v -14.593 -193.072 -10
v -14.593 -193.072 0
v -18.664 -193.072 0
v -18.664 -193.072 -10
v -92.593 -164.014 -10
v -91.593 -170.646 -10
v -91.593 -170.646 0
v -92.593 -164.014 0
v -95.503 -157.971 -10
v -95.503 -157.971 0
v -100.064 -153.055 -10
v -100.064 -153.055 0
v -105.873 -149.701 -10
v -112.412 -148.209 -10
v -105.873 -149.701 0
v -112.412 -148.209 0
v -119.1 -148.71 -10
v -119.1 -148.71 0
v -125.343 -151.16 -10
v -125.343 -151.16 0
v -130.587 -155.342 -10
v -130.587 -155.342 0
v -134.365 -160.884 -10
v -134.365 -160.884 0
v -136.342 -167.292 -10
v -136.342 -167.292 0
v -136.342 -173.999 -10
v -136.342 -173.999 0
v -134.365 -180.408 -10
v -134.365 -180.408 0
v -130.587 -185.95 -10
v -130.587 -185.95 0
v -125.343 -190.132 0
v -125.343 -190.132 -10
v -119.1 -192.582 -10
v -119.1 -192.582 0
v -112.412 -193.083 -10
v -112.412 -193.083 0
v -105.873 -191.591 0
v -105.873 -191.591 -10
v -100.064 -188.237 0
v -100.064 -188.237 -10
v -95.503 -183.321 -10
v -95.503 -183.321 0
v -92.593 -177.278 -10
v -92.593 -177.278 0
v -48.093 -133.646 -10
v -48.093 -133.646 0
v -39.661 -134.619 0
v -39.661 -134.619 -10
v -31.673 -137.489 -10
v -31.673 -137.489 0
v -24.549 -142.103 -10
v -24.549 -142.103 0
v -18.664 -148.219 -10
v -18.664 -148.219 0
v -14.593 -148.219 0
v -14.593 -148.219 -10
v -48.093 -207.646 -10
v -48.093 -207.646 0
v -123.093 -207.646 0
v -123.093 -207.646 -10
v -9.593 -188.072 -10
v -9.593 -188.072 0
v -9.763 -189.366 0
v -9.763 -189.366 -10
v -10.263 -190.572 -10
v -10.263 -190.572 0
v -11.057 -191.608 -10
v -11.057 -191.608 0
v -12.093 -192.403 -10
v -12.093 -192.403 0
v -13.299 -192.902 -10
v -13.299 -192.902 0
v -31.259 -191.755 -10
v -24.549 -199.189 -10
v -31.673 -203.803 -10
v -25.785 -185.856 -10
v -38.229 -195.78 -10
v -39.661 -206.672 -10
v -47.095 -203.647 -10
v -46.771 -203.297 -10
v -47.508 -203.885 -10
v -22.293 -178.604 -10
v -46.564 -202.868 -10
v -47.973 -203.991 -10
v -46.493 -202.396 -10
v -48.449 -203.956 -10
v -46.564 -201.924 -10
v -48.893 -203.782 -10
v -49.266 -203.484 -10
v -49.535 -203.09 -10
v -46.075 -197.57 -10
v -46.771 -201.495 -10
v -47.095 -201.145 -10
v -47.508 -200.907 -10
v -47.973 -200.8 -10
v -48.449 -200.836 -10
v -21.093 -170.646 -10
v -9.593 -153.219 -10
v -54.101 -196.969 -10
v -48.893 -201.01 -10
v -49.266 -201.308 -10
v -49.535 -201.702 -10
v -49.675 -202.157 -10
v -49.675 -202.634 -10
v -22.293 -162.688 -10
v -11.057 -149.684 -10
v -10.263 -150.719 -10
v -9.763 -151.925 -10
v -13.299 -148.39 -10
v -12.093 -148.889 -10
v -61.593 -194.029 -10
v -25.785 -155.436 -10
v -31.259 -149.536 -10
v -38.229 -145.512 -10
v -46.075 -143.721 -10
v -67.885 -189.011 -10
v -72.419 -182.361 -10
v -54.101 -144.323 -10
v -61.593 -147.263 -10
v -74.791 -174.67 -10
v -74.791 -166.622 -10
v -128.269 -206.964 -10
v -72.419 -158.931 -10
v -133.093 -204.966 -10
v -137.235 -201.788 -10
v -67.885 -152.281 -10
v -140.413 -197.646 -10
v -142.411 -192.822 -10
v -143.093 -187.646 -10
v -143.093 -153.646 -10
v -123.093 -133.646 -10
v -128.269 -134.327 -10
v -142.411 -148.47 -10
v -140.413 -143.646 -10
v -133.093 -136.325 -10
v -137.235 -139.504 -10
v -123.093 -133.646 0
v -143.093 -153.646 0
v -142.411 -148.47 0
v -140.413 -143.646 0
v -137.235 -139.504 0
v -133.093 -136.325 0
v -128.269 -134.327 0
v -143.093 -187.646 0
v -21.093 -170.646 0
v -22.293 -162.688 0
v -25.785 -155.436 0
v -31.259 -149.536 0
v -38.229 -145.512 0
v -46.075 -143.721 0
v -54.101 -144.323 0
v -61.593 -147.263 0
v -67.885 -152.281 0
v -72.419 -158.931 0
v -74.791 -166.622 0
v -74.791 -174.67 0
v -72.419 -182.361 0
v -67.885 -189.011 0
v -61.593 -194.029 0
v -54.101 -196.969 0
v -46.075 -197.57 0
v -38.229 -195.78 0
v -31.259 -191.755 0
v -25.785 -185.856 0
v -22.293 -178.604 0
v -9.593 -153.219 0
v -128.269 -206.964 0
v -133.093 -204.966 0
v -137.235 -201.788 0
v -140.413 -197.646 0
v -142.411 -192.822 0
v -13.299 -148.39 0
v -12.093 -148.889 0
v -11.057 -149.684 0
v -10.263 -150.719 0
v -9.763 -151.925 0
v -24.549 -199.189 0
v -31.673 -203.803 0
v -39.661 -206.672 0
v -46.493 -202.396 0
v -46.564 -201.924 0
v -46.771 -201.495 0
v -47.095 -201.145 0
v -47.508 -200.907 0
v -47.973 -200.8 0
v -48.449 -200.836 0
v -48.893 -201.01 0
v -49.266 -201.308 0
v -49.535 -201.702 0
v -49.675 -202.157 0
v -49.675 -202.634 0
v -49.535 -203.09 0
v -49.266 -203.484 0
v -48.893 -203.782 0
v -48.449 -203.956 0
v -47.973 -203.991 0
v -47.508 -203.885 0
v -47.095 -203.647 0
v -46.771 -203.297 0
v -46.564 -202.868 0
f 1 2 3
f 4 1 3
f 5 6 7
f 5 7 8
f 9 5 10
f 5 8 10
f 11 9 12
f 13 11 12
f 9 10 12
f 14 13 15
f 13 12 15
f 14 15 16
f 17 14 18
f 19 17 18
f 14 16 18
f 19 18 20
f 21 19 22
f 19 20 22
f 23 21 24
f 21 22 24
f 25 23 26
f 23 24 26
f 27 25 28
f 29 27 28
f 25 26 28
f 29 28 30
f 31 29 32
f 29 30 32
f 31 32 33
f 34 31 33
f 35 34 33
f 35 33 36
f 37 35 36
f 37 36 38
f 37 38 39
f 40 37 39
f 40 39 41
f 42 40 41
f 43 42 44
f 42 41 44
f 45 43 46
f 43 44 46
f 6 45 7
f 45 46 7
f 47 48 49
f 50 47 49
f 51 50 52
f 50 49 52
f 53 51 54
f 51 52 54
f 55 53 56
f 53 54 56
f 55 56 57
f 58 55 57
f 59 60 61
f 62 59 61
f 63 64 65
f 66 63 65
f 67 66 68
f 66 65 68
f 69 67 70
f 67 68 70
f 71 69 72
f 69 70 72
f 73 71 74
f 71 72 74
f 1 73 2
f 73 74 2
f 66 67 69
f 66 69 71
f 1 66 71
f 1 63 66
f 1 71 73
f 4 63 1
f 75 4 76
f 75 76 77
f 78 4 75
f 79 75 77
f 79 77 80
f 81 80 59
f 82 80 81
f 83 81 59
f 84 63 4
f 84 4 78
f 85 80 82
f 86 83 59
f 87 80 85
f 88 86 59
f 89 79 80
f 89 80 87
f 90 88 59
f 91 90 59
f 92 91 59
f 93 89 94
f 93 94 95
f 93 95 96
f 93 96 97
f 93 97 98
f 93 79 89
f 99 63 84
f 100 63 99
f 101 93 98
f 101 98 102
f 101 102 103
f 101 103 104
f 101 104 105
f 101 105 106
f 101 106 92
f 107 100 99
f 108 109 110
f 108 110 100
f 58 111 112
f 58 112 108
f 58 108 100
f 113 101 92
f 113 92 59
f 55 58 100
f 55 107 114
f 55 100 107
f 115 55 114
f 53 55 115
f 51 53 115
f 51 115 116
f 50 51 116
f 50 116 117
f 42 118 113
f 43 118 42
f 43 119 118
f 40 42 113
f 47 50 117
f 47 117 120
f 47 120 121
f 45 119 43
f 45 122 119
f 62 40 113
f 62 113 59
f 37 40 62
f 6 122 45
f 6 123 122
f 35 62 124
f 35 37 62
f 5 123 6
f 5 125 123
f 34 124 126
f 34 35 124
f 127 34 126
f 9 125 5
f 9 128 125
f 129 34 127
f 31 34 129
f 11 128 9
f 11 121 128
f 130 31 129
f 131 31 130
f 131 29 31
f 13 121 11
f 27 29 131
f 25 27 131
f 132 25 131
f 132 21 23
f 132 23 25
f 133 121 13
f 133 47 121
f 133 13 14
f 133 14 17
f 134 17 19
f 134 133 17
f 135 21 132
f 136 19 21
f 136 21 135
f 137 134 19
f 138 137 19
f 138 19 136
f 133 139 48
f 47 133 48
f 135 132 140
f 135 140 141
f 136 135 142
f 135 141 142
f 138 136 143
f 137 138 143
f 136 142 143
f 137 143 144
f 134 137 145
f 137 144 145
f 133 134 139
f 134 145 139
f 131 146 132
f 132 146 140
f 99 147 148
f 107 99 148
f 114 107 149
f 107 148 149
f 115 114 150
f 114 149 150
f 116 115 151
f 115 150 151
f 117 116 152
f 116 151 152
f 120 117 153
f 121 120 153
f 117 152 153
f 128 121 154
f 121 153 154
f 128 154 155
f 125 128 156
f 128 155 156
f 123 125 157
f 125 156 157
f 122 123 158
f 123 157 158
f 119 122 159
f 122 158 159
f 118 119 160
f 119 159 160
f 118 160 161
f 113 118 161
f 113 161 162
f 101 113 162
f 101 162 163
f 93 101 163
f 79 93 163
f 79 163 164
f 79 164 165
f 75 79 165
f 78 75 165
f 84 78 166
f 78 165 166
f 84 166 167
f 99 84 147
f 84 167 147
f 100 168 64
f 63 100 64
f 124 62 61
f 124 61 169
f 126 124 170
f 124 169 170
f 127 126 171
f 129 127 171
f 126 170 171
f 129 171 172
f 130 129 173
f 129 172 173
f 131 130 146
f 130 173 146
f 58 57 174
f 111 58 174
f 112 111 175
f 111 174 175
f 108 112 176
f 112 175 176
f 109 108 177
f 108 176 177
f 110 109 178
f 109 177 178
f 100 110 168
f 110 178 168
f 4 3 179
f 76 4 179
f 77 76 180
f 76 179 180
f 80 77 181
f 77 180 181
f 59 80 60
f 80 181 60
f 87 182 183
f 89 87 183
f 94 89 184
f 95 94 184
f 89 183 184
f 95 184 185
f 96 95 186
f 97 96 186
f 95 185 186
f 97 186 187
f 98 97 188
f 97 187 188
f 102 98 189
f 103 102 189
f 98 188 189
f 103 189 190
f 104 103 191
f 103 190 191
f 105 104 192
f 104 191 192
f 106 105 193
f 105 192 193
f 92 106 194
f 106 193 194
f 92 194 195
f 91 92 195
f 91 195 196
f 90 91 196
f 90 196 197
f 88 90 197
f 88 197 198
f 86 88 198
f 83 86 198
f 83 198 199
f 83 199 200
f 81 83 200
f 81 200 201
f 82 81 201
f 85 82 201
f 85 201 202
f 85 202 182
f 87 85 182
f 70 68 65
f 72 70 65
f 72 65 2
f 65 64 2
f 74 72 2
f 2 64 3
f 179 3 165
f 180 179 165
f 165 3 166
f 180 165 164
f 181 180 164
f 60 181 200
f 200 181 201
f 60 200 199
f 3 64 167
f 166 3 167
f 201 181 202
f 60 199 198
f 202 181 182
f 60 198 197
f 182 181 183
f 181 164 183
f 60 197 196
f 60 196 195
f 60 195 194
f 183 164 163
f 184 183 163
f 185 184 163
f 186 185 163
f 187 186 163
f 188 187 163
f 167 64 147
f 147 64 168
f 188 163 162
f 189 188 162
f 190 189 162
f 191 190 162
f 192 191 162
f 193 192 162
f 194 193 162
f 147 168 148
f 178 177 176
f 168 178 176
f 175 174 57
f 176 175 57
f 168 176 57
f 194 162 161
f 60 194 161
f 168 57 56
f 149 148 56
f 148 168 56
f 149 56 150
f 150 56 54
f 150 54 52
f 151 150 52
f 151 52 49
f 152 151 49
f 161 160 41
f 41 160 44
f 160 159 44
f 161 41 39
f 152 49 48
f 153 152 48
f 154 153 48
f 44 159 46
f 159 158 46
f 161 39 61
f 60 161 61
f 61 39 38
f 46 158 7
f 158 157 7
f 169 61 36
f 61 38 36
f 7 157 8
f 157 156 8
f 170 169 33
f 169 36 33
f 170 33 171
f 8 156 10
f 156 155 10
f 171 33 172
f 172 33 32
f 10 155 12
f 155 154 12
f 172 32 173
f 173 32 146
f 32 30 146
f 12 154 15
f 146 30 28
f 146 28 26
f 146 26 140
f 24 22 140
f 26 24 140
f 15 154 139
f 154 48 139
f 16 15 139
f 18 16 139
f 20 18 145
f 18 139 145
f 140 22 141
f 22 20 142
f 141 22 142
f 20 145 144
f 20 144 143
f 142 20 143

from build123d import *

# Parameters (mm, degrees)
SKETCH1_R           = 27
SKETCH1_R_2         = 22.5
BOSS_EXTRUDE1_DEPTH = 10
SKETCH2_R           = 1.6
CUT_EXTRUDE1_DEPTH  = 11


with BuildPart() as part:
    # Sketch1 → Boss-Extrude1 (new body)
    with BuildSketch(Plane.XY):
        with BuildLine():
            Line((-48.092977135, -207.645932851), (-123.092977135, -207.645932851))
            ThreePointArc((-123.092977135, -207.645932851), (-137.235112759, -201.788068475), (-143.092977135, -187.645932851))
            Line((-143.092977135, -187.645932851), (-143.092977135, -153.645932851))
            ThreePointArc((-143.092977135, -153.645932851), (-137.235112759, -139.503797227), (-123.092977135, -133.645932851))
            Line((-123.092977135, -133.645932851), (-48.092977135, -133.645932851))
            ThreePointArc((-48.092977135, -133.645932851), (-31.673163065, -137.488886754), (-18.664191619, -148.219462263))
            Line((-18.664191619, -148.219462263), (-14.592977135, -148.219462263))
            ThreePointArc((-14.592977135, -148.219462263), (-11.05744323, -149.683928357), (-9.592977135, -153.219462263))
            Line((-9.592977135, -153.219462263), (-9.592977135, -188.072403439))
            ThreePointArc((-9.592977135, -188.072403439), (-11.05744323, -191.607937345), (-14.592977135, -193.072403439))
            Line((-14.592977135, -193.072403439), (-18.664191619, -193.072403439))
            ThreePointArc((-18.664191619, -193.072403439), (-31.673163065, -203.802978948), (-48.092977135, -207.645932851))
        make_face()
        with Locations((-48.092977135, -170.645932851)):
            Circle(SKETCH1_R, mode=Mode.SUBTRACT)
        with Locations((-114.092977135, -170.645932851)):
            Circle(SKETCH1_R_2, mode=Mode.SUBTRACT)
    extrude(amount=-BOSS_EXTRUDE1_DEPTH)

    # Sketch2 → Cut-Extrude1 (cut, through all)
    with BuildSketch(Plane.XY):
        with Locations((-48.092977135, -202.395935058)):
            Circle(SKETCH2_R)
    extrude(amount=-CUT_EXTRUDE1_DEPTH, mode=Mode.SUBTRACT)


solid = part.part
